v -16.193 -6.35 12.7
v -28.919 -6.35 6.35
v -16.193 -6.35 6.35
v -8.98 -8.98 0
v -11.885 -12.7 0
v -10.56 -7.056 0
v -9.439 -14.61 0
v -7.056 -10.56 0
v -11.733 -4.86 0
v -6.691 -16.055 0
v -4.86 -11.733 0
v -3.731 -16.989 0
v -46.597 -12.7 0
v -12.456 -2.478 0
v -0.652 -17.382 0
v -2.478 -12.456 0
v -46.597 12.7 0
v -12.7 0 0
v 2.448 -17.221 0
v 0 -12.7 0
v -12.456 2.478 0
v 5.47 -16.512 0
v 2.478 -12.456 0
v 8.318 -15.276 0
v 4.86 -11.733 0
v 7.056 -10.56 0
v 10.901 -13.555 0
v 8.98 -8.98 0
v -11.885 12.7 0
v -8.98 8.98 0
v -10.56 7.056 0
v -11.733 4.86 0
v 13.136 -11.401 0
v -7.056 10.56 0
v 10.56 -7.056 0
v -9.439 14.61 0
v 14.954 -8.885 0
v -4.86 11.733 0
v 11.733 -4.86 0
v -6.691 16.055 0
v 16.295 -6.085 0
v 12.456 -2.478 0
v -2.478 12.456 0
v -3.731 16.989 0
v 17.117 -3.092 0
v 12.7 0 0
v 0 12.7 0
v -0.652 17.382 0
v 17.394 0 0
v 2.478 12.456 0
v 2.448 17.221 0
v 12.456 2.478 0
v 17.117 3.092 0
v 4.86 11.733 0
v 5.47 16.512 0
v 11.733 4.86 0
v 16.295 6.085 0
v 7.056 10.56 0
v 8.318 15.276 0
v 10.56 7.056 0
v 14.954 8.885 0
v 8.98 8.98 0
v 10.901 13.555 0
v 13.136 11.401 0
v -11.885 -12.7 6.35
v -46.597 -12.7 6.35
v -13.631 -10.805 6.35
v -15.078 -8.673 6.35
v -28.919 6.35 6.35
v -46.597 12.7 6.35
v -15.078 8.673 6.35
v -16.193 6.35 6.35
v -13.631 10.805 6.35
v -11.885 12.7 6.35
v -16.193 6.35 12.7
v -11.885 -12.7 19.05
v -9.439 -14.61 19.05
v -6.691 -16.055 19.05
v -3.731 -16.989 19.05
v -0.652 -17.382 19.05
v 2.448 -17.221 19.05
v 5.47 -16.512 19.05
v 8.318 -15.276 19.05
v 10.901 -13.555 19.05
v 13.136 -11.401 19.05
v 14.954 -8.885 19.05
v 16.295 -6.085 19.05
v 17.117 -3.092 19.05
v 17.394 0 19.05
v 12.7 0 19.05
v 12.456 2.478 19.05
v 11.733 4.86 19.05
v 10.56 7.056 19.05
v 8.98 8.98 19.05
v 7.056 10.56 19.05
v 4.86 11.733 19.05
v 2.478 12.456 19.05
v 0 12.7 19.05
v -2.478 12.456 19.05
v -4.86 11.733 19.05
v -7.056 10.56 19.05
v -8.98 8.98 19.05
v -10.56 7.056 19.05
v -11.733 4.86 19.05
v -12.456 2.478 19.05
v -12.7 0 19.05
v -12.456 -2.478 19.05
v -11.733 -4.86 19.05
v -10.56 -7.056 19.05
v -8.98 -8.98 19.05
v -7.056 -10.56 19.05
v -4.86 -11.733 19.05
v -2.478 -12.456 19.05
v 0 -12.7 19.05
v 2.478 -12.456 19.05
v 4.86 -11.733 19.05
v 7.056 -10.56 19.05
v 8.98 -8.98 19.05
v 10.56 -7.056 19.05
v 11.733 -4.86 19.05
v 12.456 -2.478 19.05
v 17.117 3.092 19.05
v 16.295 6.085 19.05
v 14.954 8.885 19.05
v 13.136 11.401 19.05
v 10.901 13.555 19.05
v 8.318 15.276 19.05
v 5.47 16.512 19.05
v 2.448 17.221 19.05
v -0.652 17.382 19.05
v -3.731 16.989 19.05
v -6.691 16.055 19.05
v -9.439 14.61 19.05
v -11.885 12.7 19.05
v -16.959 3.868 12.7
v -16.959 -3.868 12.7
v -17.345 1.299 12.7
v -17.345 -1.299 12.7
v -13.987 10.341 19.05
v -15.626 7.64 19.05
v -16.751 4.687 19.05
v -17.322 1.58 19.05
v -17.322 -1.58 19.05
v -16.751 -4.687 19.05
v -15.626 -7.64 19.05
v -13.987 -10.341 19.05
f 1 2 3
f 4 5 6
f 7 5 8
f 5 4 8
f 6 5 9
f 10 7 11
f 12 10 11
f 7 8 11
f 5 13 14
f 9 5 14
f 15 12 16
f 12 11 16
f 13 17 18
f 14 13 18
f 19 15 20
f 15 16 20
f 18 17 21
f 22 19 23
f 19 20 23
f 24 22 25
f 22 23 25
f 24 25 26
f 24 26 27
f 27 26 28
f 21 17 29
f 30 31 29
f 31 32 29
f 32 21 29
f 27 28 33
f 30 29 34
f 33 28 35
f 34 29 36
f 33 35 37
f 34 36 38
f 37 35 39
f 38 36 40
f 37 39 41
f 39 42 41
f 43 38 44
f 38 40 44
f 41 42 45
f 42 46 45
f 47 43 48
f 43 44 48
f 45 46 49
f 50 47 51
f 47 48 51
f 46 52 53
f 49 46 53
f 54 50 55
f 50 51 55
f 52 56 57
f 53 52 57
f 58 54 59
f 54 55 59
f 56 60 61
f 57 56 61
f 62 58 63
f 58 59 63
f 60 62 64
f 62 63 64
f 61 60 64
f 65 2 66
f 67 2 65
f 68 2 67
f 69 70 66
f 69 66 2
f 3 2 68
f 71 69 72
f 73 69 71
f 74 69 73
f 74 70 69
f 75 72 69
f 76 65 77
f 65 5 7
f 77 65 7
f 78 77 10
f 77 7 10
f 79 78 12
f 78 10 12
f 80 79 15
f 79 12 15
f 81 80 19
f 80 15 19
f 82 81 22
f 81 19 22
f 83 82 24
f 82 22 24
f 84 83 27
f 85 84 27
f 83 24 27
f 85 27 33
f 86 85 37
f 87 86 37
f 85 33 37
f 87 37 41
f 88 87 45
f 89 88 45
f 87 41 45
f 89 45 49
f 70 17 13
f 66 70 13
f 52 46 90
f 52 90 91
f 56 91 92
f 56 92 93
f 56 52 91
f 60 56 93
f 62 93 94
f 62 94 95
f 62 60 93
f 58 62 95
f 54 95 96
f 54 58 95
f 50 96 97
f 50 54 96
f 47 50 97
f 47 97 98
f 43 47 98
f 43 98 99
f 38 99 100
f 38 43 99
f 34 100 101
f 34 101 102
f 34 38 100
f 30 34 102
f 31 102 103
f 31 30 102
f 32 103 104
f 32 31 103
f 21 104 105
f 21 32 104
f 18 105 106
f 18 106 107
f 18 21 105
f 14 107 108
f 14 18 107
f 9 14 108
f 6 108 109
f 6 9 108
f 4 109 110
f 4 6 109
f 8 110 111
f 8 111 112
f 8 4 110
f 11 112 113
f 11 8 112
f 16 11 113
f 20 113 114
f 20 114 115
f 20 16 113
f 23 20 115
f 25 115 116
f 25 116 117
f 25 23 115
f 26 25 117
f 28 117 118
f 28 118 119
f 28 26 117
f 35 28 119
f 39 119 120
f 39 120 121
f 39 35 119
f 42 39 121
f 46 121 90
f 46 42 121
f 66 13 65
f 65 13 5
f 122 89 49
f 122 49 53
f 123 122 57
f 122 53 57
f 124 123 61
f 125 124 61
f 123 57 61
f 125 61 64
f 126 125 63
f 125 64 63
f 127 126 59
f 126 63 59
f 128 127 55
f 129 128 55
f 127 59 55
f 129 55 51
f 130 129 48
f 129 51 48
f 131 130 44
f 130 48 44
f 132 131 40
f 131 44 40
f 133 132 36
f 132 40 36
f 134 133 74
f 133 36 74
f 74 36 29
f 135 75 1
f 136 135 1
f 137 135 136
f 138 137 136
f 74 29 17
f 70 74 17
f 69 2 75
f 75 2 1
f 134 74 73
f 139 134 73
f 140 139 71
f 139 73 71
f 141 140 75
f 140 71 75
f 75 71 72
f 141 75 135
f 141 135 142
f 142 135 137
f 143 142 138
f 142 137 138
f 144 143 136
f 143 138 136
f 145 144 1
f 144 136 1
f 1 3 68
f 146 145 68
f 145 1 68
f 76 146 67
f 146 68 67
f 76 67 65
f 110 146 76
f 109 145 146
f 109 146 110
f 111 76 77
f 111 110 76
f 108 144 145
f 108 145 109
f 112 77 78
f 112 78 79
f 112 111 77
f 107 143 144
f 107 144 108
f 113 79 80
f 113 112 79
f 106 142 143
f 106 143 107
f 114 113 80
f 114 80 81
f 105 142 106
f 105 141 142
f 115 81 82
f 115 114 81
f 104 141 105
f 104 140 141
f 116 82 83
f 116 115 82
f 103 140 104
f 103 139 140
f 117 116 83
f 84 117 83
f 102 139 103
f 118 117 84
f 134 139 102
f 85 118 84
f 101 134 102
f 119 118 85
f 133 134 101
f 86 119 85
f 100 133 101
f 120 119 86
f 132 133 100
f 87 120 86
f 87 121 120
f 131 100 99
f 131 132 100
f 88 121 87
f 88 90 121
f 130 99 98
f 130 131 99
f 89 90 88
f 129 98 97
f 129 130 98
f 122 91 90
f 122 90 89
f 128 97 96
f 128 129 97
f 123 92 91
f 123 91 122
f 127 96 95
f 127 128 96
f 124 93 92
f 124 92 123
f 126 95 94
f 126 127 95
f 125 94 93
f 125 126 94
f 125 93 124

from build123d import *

# Parameters (mm, degrees)
F0_R     = 12.7
F1_DEPTH = 19.05
F2_DEPTH = 6.35
F4_DEPTH = 6.35
F6_DEPTH = 25.4


with BuildPart() as f1:
    # F0 (on Top) → F1 (new body)
    with BuildSketch(Plane.XY):
        with BuildLine():
            ThreePointArc((-11.8853662155, -12.7), (6.9216194995, -15.9575409628), (17.3940199516, 0))
            ThreePointArc((17.3940199516, 0), (6.9216194995, 15.9575409628), (-11.8853662155, 12.7))
            ThreePointArc((-11.8853662155, 12.7), (-17.3940199516, 0), (-11.8853662155, -12.7))
        make_face()
        Circle(F0_R, mode=Mode.SUBTRACT)
    extrude(amount=F1_DEPTH)

    # F0 (on Top) → F2 (join)
    with BuildSketch(Plane.XY):
        with BuildLine():
            ThreePointArc((-11.8853662155, -12.7), (-17.3940199516, 0), (-11.8853662155, 12.7))
            Line((-11.8853662155, 12.7), (-46.5966239572, 12.7))
            Line((-46.5966239572, 12.7), (-46.5966239572, -12.7))
            Line((-46.5966239572, -12.7), (-11.8853662155, -12.7))
        make_face()
    extrude(amount=F2_DEPTH)

    # F3 (on face) → F4 (join)
    with BuildSketch(Plane.XY.offset(6.35)):
        with BuildLine():
            Line((-28.9193168283, 6.35), (-28.9193168283, 0))
            Line((-28.9193168283, 0), (-28.9193168283, -6.35))
            Line((-28.9193168283, -6.35), (-16.1934996241, -6.35))
            ThreePointArc((-16.1934996241, -6.35), (-17.3940199516, 0), (-16.1934996241, 6.35))
            Line((-16.1934996241, 6.35), (-28.9193168283, 6.35))
        make_face()
    extrude(amount=F4_DEPTH)

    # F5 (on face) → F6 (cut)
    with BuildSketch(Plane.XZ.offset(6.35)):
        Polygon((-28.9193168283, 12.7), (-28.9193168283, 6.35), (-16.1934996241, 12.7), align=None)
    extrude(amount=-F6_DEPTH, mode=Mode.SUBTRACT)


solid = f1.part
